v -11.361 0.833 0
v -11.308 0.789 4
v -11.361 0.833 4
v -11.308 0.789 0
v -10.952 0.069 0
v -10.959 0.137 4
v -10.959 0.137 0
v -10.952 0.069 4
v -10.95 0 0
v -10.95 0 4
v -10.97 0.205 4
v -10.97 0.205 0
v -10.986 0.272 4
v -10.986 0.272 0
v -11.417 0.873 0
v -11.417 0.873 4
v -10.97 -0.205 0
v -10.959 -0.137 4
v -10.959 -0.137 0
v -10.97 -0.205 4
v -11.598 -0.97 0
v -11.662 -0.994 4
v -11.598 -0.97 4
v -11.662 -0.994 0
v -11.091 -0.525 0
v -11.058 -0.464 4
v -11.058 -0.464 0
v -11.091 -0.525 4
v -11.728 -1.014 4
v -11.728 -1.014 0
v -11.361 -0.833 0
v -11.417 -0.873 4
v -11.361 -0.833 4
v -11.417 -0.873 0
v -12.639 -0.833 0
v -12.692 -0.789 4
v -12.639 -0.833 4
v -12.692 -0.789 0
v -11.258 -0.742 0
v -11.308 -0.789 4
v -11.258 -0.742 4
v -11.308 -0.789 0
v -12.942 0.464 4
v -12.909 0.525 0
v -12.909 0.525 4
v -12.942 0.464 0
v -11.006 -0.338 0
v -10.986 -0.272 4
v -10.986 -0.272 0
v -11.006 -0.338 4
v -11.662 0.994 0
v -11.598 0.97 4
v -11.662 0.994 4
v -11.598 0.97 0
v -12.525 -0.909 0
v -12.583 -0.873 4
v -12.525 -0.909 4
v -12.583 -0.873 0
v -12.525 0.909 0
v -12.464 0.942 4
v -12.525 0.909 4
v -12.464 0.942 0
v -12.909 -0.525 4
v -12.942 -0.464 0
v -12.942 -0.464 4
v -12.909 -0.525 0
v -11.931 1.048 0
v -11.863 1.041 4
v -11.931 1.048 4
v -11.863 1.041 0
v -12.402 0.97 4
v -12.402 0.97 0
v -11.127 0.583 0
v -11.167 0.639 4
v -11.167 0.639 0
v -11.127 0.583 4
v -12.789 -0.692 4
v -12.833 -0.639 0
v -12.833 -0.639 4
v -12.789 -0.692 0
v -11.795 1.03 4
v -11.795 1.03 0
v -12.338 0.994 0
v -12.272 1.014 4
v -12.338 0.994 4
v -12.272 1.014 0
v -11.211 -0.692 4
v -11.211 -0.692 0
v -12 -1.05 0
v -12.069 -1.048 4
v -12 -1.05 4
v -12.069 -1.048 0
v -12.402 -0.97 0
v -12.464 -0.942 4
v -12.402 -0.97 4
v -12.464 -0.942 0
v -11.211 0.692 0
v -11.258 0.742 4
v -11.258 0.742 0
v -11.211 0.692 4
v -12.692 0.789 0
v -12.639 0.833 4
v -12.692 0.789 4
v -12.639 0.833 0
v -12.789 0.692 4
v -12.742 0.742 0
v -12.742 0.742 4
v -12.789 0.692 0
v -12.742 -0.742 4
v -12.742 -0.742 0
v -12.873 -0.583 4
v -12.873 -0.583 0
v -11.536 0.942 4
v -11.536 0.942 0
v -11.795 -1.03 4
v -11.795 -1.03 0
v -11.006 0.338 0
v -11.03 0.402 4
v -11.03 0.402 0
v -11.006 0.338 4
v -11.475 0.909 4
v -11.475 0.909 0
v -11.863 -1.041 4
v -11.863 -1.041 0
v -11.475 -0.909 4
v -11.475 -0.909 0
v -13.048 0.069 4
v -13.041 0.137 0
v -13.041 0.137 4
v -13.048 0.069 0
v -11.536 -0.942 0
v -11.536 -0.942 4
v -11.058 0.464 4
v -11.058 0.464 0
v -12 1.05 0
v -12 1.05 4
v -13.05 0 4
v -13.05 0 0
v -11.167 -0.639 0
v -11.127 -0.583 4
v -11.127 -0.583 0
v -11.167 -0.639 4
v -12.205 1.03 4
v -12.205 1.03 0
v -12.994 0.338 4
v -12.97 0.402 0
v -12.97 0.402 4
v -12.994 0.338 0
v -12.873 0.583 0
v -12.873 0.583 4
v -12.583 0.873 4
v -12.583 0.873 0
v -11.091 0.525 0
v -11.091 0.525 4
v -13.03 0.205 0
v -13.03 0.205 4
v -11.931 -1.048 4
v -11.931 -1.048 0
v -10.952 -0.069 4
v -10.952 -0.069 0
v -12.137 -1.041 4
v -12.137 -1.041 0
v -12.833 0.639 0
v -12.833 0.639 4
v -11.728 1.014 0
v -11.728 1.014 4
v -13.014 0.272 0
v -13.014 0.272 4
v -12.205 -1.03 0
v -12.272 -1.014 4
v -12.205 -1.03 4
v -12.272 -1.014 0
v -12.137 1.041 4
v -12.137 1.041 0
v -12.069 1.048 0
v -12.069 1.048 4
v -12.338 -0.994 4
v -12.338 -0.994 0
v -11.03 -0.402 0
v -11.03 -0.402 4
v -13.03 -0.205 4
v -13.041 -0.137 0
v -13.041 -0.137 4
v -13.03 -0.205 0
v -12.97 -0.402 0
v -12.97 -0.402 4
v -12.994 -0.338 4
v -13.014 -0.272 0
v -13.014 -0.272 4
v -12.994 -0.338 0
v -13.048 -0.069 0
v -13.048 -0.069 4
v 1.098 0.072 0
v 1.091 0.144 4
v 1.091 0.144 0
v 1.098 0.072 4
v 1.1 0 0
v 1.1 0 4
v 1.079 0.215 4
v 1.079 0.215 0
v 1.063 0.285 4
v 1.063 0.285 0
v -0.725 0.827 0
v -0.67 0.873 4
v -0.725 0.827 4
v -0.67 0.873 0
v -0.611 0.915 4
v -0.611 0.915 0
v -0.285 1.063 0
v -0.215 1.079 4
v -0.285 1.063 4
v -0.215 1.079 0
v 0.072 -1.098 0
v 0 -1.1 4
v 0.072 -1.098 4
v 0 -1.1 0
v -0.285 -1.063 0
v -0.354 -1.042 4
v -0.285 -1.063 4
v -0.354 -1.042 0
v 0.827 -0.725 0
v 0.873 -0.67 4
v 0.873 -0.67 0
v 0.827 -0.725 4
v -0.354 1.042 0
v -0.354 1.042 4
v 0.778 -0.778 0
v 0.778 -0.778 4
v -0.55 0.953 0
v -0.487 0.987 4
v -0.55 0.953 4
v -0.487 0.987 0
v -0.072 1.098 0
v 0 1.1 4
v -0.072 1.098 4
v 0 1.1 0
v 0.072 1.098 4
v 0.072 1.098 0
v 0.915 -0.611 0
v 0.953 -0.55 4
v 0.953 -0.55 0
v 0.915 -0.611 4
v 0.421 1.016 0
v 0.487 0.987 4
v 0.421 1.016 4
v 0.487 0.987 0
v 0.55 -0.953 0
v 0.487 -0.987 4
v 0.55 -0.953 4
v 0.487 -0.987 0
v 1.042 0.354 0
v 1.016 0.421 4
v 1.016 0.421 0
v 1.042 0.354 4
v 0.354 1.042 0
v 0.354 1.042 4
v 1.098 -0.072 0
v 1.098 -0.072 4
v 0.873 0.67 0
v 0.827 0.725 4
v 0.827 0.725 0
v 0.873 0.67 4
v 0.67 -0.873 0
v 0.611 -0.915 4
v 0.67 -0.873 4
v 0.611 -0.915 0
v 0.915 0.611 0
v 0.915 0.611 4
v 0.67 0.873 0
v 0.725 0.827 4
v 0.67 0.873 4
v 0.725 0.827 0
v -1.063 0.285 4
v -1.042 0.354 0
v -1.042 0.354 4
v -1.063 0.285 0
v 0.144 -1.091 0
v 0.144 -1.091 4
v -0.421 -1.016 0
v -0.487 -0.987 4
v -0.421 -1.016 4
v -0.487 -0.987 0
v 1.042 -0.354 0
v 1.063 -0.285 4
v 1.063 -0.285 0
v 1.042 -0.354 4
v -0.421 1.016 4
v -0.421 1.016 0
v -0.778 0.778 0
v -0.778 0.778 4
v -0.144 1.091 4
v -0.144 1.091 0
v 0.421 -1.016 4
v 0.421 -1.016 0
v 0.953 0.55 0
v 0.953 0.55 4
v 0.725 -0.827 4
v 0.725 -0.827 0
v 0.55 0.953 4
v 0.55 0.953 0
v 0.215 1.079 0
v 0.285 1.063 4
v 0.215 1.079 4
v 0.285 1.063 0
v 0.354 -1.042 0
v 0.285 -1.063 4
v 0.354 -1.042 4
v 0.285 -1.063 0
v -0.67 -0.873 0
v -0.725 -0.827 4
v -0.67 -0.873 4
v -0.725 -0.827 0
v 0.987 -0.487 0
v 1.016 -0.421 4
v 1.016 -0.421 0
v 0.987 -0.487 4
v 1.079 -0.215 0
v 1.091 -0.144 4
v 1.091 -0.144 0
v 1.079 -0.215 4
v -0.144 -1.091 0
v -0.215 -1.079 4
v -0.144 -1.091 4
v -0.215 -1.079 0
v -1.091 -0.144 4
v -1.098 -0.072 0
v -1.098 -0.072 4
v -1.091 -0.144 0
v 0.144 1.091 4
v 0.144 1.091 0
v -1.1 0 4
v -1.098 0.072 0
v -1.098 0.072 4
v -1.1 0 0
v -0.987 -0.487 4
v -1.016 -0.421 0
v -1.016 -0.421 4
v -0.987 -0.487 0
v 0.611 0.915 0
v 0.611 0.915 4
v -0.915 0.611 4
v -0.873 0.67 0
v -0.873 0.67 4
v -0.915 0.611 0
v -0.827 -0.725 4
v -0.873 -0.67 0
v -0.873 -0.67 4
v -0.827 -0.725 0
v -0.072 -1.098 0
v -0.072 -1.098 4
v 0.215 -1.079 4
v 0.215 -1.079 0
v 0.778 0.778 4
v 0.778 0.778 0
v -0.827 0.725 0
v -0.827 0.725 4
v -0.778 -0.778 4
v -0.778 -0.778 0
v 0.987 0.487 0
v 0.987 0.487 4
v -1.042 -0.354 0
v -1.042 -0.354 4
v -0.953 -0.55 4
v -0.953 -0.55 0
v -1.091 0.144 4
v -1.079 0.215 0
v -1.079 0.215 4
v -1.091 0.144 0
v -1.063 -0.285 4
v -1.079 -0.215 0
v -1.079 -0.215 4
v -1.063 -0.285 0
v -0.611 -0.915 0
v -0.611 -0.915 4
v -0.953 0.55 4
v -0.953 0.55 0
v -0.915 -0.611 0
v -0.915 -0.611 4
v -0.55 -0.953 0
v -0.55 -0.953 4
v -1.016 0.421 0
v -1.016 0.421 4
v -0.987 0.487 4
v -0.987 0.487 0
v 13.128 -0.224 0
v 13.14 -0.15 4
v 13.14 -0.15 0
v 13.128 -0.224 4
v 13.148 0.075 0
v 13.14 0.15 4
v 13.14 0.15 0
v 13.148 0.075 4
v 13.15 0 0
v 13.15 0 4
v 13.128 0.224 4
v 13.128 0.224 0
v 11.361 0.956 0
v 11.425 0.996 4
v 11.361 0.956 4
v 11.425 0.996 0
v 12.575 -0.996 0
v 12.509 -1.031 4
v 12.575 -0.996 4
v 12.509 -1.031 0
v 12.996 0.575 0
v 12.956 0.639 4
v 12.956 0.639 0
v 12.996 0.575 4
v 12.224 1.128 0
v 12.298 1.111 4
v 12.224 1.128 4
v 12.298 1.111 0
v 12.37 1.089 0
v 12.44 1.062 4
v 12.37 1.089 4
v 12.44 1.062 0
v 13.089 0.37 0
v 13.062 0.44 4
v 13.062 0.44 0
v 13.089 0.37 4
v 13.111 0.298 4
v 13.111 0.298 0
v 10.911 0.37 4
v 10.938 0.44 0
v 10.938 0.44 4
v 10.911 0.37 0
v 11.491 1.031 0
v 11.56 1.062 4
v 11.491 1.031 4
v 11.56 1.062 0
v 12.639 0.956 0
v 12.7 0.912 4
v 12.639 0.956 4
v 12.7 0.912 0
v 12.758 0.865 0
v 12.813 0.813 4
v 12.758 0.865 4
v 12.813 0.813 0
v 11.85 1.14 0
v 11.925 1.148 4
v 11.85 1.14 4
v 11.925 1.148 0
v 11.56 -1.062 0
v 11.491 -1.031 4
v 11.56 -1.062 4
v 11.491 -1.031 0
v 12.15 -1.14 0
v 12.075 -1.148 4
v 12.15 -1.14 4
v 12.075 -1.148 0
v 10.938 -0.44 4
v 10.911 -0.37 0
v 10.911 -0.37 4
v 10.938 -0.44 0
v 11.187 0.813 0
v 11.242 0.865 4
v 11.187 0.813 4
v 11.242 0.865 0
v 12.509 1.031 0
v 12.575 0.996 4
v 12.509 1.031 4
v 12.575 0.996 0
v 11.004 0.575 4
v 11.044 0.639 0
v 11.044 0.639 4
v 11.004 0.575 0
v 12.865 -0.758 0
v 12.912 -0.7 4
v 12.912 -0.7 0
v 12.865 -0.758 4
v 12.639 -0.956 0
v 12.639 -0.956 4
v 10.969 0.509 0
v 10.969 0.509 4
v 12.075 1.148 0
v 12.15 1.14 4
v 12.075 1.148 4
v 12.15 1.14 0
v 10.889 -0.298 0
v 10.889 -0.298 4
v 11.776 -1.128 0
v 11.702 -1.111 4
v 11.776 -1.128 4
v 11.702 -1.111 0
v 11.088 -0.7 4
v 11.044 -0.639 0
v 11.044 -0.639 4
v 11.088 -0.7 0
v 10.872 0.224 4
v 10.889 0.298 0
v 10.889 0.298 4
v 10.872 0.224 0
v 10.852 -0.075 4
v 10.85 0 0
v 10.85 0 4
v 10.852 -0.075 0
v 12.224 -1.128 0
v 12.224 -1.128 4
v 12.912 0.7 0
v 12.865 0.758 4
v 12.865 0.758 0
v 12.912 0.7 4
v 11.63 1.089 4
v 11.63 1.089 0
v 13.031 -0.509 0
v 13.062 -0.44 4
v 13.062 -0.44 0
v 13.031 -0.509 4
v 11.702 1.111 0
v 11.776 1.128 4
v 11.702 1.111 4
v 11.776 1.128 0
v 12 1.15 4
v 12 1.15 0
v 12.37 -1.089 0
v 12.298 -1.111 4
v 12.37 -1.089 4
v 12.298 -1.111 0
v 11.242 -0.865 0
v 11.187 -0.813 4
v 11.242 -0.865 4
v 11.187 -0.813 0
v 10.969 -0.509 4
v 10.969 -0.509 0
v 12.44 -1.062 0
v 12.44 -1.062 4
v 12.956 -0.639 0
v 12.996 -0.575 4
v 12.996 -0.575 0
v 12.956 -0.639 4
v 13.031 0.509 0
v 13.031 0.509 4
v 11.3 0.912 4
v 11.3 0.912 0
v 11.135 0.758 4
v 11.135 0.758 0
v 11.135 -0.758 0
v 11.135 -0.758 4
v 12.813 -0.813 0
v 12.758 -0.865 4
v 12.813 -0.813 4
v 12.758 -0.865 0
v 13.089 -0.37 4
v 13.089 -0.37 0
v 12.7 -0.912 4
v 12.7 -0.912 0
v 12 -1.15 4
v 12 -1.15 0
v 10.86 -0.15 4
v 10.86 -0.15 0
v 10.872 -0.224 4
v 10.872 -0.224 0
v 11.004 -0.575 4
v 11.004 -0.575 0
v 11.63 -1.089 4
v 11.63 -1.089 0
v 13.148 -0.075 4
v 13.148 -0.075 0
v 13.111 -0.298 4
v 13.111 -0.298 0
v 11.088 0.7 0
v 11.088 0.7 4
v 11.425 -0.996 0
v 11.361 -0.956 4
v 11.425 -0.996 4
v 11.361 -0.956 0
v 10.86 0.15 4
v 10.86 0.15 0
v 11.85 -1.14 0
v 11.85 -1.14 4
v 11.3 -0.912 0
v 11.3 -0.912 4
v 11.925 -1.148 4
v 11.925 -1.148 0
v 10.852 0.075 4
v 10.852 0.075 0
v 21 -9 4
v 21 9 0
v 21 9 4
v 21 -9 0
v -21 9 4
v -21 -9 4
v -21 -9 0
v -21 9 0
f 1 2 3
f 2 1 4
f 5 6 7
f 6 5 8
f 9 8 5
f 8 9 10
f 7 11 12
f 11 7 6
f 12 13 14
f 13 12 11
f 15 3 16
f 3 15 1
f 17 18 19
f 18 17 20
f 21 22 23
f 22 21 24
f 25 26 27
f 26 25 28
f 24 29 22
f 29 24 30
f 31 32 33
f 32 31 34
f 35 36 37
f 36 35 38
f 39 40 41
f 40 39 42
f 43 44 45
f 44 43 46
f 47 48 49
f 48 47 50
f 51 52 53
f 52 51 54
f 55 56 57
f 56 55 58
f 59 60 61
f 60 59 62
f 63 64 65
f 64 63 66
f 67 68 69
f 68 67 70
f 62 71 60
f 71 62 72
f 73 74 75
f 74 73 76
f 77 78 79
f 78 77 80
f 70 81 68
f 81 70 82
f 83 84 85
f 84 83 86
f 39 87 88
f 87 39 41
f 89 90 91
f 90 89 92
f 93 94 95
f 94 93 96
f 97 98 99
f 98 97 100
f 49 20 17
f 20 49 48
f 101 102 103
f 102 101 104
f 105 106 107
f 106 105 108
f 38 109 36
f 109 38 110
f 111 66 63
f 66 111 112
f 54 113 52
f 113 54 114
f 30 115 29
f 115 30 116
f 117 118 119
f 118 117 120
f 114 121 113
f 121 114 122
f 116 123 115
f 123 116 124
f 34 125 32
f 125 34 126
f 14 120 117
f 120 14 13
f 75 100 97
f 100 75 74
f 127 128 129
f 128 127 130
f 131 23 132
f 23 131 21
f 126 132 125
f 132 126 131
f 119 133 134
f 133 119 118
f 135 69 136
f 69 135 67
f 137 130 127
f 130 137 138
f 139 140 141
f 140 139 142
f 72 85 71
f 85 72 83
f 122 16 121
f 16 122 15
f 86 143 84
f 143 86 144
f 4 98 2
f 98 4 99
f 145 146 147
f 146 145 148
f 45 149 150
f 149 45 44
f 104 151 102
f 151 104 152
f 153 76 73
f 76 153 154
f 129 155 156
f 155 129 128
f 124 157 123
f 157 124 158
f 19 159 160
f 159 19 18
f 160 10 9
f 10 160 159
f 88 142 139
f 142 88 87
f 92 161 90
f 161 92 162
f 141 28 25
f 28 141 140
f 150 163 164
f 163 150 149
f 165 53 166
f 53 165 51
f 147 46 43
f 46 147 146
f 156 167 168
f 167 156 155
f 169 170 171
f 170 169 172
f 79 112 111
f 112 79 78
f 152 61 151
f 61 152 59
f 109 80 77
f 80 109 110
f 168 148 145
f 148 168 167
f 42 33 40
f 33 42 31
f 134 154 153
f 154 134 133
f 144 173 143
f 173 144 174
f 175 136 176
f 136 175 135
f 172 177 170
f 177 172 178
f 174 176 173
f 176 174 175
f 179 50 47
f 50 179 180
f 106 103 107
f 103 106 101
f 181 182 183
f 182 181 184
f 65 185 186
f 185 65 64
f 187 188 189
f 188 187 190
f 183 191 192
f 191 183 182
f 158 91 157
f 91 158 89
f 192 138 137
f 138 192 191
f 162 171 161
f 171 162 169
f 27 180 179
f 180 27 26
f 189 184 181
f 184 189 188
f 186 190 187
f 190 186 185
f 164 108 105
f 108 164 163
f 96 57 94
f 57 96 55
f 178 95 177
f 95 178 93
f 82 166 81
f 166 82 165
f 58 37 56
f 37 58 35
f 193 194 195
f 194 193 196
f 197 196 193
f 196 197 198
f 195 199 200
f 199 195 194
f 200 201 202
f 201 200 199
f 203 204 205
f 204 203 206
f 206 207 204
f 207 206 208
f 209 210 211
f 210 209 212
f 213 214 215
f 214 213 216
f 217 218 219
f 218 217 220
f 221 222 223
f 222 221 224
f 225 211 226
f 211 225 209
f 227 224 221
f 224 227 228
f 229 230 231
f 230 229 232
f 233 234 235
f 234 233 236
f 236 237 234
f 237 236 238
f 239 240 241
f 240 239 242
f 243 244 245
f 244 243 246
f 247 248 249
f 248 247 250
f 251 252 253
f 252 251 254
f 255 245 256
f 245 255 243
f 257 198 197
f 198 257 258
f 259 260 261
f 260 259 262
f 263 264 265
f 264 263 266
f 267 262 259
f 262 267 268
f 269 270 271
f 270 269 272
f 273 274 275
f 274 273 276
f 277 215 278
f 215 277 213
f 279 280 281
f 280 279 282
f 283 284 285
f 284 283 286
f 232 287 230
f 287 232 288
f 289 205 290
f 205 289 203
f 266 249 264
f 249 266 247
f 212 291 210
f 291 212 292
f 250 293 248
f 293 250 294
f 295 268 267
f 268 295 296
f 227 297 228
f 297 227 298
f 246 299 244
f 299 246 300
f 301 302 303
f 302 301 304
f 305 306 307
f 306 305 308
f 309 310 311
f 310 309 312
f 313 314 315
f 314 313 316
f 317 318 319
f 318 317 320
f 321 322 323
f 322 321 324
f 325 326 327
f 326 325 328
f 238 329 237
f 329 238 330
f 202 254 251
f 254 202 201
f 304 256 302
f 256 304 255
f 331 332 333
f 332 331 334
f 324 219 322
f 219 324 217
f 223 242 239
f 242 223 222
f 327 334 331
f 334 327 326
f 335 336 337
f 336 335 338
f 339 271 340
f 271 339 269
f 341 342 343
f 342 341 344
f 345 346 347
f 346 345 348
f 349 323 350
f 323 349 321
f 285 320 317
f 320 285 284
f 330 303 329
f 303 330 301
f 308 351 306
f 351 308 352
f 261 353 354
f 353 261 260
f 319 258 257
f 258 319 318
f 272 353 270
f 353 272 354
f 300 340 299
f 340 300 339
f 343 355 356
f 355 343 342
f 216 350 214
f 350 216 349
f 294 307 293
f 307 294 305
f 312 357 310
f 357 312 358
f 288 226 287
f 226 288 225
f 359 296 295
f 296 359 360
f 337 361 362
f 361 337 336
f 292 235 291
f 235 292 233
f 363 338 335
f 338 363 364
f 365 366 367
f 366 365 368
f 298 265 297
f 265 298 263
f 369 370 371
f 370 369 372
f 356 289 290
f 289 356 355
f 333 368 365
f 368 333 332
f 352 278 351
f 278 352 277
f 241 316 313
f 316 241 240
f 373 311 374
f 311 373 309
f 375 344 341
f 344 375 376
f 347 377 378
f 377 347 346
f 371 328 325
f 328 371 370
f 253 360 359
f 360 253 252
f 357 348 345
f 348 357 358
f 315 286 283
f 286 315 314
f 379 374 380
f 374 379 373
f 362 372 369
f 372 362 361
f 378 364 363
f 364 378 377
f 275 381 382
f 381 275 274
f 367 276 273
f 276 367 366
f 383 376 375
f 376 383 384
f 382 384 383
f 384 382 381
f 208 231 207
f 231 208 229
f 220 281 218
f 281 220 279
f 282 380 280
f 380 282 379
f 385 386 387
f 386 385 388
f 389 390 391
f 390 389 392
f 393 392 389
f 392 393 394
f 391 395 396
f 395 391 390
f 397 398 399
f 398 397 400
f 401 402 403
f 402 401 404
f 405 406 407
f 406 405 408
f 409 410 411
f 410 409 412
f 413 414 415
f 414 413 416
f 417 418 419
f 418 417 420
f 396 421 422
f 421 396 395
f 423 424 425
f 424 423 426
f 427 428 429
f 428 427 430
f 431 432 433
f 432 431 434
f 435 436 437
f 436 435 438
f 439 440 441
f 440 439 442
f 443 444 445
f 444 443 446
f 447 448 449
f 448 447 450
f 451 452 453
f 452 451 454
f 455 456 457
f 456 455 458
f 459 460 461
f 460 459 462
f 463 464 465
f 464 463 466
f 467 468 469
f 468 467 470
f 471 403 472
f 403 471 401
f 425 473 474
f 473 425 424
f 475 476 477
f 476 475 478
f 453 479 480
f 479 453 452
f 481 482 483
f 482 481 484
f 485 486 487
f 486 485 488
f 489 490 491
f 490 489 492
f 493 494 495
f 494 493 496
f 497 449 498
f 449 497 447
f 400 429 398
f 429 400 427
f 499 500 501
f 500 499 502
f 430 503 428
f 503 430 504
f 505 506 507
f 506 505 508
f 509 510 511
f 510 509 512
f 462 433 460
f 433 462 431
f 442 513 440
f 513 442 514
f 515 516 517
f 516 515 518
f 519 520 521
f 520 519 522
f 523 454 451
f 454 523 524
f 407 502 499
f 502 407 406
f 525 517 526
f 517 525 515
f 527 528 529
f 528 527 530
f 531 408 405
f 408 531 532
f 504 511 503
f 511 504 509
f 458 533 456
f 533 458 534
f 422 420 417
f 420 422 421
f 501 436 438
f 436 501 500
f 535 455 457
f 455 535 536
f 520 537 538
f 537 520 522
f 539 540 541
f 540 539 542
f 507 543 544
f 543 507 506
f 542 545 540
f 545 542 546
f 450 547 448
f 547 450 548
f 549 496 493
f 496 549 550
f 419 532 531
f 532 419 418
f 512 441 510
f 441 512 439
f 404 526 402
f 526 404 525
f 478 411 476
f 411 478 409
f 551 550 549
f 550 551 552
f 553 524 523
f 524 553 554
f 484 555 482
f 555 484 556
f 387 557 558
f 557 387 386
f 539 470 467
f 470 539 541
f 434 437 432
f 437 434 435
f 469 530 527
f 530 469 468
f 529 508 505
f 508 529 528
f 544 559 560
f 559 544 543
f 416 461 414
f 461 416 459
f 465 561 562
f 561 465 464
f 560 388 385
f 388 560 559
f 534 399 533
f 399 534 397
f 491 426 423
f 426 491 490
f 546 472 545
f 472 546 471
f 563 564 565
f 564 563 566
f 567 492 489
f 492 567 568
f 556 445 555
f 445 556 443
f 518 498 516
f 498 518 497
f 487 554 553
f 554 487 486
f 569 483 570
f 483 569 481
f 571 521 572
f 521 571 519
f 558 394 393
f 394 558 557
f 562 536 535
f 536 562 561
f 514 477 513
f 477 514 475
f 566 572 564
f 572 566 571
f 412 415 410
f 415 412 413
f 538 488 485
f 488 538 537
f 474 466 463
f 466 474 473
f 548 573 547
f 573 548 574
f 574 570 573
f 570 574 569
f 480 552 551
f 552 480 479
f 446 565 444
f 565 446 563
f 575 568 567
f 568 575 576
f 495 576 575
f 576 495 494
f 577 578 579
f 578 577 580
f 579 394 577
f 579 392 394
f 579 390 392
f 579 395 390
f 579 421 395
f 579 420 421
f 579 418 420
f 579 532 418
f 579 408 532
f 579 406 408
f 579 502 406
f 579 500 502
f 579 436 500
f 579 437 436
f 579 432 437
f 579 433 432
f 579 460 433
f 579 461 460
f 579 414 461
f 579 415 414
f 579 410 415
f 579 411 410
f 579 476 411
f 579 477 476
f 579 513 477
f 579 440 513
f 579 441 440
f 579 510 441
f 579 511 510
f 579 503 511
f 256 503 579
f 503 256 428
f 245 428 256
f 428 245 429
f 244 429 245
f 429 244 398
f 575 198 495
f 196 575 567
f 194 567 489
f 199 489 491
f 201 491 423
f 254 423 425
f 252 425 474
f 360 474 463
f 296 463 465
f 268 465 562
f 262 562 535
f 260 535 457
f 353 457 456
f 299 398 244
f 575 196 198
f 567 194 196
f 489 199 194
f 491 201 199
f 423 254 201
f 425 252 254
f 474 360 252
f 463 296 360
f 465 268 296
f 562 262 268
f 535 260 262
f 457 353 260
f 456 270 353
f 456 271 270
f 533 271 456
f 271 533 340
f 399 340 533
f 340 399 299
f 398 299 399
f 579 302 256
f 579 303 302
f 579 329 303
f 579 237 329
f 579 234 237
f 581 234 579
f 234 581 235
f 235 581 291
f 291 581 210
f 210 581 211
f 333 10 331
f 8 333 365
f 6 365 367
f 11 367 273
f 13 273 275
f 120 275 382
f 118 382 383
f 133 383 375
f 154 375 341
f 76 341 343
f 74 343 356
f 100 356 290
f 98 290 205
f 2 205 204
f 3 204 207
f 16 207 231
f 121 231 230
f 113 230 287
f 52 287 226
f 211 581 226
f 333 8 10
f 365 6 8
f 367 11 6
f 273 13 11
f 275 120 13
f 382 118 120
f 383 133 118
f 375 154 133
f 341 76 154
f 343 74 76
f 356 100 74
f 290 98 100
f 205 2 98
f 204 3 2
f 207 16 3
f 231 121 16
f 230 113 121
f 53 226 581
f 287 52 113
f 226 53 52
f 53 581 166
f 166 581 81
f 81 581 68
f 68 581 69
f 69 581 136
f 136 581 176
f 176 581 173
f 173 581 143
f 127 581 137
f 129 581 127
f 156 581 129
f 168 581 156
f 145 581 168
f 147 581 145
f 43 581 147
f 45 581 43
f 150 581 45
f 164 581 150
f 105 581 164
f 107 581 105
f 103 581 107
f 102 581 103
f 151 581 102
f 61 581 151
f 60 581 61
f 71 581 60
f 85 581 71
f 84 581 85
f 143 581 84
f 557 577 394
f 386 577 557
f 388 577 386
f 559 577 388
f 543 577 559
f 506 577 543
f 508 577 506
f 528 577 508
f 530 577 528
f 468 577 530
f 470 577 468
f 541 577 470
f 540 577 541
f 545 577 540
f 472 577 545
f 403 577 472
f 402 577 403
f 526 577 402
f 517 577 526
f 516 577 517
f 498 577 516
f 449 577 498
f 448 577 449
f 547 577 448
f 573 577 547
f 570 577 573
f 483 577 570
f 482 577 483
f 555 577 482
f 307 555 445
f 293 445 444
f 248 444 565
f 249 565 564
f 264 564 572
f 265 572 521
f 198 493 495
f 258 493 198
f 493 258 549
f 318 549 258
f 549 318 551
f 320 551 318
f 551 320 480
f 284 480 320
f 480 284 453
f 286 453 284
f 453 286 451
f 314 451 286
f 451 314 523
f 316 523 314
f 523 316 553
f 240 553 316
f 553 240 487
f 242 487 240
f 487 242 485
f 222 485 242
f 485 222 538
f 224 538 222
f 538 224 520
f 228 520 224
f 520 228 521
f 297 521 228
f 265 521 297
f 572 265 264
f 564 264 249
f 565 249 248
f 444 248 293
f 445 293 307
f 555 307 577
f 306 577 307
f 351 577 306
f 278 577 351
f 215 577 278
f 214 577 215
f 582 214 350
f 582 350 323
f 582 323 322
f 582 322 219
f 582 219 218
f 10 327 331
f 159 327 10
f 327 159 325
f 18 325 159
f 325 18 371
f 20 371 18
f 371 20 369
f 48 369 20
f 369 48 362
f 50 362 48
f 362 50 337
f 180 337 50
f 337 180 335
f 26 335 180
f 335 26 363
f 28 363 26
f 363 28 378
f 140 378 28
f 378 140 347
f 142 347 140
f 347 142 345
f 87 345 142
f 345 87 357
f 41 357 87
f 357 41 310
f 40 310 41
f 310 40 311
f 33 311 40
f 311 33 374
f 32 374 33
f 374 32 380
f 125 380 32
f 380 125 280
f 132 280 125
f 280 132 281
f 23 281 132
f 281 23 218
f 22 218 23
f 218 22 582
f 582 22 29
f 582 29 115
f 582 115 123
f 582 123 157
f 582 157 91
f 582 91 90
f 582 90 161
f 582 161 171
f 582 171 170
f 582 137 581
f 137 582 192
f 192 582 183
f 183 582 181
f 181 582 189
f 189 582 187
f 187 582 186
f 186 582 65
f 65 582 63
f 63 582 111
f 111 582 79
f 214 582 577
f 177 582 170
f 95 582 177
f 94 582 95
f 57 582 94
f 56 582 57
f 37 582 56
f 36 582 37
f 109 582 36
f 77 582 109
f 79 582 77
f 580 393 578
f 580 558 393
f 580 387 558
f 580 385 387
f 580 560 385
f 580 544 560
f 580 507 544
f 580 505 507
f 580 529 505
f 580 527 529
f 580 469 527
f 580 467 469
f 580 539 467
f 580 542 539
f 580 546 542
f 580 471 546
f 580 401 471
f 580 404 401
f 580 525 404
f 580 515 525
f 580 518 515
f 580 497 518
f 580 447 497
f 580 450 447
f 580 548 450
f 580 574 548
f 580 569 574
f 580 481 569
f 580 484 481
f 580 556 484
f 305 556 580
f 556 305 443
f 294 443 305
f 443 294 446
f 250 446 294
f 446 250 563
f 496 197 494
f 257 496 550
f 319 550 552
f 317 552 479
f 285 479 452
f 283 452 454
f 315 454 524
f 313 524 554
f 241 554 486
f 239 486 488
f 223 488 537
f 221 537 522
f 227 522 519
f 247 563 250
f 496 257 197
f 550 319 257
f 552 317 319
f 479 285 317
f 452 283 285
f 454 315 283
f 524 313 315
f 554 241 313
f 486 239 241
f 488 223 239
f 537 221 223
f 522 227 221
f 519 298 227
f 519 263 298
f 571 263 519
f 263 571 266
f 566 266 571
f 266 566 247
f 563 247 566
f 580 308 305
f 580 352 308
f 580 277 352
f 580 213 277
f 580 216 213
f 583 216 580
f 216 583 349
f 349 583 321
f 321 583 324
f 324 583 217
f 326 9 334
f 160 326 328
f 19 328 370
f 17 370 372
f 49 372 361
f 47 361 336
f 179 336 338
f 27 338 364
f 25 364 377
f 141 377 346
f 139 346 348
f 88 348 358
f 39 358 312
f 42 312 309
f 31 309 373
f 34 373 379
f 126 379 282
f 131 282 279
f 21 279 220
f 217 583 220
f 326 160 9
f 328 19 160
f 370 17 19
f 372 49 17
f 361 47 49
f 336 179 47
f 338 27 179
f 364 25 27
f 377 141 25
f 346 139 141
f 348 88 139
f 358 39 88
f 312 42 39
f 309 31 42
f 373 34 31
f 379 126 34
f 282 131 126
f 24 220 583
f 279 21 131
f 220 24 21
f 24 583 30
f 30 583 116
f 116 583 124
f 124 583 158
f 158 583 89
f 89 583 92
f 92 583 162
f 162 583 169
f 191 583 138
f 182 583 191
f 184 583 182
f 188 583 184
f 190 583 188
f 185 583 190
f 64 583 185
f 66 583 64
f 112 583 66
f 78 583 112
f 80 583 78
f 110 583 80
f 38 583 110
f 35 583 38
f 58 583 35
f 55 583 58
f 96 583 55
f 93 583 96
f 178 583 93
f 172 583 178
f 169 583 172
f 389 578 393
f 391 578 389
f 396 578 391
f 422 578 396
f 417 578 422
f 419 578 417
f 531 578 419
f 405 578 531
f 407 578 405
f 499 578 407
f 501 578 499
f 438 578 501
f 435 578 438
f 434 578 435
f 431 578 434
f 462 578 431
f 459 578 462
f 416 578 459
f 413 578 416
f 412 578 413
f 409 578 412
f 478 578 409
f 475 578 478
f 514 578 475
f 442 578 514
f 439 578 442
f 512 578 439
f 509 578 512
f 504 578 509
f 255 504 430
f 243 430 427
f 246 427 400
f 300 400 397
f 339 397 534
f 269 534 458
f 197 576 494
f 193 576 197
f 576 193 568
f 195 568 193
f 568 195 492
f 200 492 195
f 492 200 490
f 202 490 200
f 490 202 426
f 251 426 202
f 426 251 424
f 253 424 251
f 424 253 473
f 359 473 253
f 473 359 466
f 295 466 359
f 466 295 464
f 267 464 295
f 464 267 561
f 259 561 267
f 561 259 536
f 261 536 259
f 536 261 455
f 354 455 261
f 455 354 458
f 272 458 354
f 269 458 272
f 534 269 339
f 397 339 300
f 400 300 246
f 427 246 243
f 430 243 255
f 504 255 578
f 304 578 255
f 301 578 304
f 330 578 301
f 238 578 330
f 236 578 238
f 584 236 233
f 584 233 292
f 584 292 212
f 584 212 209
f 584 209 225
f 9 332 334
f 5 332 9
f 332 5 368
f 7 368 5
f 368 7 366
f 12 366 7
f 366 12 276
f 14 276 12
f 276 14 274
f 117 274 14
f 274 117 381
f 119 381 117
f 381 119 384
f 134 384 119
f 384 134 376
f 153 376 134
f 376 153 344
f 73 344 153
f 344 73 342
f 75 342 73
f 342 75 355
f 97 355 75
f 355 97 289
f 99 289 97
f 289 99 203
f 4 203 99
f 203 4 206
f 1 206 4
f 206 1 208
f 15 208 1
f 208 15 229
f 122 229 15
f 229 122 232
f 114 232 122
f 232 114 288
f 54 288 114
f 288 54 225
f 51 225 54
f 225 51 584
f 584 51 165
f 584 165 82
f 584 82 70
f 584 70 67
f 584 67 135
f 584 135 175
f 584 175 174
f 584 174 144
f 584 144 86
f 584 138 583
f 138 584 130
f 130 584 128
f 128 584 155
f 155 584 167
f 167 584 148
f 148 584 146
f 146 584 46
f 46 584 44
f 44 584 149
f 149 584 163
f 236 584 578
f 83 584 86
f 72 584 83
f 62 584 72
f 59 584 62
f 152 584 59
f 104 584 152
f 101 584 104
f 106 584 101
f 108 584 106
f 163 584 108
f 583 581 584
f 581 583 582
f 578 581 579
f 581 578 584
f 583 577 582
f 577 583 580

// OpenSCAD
// SystemEdu wind-solar starter, mm. Unprinted design; measure your purchased parts first.
// This source matches flat STL templates; complete mounts/guard mesh are a learner CAD task.
$fn=96; bore=2.2; radius=55; pitch=25;
part="fit-coupon";
module flat(w,h,t,holes){ difference(){translate([-w/2,-h/2,0])cube([w,h,t]); for(p=holes) translate([p[0],p[1],-1])cylinder(h=t+2,r=p[2]);}}
module disk(r,t,holes){difference(){cylinder(h=t,r=r);for(p=holes)translate([p[0],p[1],-1])cylinder(h=t+2,r=p[2]);}}
if(part=="base")flat(130,90,4,[[-40,0,1.7],[40,0,1.7],[0,0,1.7],[-50,-30,1.7],[50,-30,1.7]]);
if(part=="solar-tray")flat(51,51,3,[[-21,-21,1.7],[21,-21,1.7],[-21,21,1.7],[21,21,1.7],[0,0,1.7]]);
if(part=="fit-coupon")flat(42,18,4,[[-12,0,(bore-.1)/2],[0,0,bore/2],[12,0,(bore+.1)/2]]);
if(part=="rotor-hub")disk(16,5,concat([[0,0,bore/2]],[for(i=[0:2])[10*cos(i*120),10*sin(i*120),1.7]]));
if(part=="guard-ring")disk(radius+10,5,[[0,0,radius+5]]);
if(part=="rotor-blade")difference(){linear_extrude(2.4)polygon([[0,-6],[radius-12,-10],[radius-10,4],[6,7],[0,6]]);translate([5,0,-1])cylinder(h=5,r=1.7);}
if(part=="upright")difference(){linear_extrude(5)polygon([[-28,0],[28,0],[18,65],[-18,65]]);for(p=[[-18,8],[18,8],[0,52]])translate([p[0],p[1],-1])cylinder(h=7,r=1.7);}
// Custom pitch wedge: print a pair for each blade, add fastening holes after measuring root.
if(part=="pitch-wedge")rotate([90,0,0])linear_extrude(12)polygon([[0,0],[12,0],[12,12*tan(pitch)]]);
